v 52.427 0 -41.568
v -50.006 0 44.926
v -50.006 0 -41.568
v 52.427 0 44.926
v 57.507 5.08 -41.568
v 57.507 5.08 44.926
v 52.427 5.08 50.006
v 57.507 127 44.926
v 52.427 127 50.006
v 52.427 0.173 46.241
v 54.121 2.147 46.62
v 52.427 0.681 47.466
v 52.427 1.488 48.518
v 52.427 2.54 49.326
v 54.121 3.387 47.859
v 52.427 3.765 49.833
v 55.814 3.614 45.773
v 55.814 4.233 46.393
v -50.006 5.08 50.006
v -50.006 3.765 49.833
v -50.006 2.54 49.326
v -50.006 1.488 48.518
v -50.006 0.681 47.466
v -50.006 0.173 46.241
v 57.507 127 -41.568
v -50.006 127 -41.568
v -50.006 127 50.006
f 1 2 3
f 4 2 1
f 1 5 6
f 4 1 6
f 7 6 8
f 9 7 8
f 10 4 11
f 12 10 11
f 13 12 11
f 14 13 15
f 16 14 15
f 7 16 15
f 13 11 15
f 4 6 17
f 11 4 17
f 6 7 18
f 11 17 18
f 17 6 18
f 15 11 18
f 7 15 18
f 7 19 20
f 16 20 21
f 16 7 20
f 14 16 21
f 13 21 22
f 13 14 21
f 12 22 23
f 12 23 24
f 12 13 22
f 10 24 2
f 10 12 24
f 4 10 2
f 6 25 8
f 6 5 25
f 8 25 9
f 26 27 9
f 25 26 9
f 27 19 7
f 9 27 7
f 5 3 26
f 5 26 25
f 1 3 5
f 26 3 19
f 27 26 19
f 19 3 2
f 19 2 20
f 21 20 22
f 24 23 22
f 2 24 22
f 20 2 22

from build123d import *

# Parameters (mm, degrees)
F0_W     = 107.513439
F0_H     = 91.573946
F1_DEPTH = 127
F2_R     = 5.08
F3_SIZE  = 5.08


with BuildPart() as f1:
    # F0 (on Front) → F1 (new body)
    with BuildSketch(Plane.XZ):
        with Locations((3.750467, 4.219279)):
            Rectangle(F0_W, F0_H)
    extrude(amount=-F1_DEPTH)

    # F2
    f2_edges = [f1.edges().sort_by_distance(p)[0] for p in [
        (3.750468, 0, 50.006252),
    ]]
    fillet(f2_edges, radius=F2_R)

    # F3
    f3_edges = [f1.edges().sort_by_distance(p)[0] for p in [
        (57.507187, 66.04, 50.006252),
    ]]
    chamfer(f3_edges, length=F3_SIZE)


solid = f1.part
